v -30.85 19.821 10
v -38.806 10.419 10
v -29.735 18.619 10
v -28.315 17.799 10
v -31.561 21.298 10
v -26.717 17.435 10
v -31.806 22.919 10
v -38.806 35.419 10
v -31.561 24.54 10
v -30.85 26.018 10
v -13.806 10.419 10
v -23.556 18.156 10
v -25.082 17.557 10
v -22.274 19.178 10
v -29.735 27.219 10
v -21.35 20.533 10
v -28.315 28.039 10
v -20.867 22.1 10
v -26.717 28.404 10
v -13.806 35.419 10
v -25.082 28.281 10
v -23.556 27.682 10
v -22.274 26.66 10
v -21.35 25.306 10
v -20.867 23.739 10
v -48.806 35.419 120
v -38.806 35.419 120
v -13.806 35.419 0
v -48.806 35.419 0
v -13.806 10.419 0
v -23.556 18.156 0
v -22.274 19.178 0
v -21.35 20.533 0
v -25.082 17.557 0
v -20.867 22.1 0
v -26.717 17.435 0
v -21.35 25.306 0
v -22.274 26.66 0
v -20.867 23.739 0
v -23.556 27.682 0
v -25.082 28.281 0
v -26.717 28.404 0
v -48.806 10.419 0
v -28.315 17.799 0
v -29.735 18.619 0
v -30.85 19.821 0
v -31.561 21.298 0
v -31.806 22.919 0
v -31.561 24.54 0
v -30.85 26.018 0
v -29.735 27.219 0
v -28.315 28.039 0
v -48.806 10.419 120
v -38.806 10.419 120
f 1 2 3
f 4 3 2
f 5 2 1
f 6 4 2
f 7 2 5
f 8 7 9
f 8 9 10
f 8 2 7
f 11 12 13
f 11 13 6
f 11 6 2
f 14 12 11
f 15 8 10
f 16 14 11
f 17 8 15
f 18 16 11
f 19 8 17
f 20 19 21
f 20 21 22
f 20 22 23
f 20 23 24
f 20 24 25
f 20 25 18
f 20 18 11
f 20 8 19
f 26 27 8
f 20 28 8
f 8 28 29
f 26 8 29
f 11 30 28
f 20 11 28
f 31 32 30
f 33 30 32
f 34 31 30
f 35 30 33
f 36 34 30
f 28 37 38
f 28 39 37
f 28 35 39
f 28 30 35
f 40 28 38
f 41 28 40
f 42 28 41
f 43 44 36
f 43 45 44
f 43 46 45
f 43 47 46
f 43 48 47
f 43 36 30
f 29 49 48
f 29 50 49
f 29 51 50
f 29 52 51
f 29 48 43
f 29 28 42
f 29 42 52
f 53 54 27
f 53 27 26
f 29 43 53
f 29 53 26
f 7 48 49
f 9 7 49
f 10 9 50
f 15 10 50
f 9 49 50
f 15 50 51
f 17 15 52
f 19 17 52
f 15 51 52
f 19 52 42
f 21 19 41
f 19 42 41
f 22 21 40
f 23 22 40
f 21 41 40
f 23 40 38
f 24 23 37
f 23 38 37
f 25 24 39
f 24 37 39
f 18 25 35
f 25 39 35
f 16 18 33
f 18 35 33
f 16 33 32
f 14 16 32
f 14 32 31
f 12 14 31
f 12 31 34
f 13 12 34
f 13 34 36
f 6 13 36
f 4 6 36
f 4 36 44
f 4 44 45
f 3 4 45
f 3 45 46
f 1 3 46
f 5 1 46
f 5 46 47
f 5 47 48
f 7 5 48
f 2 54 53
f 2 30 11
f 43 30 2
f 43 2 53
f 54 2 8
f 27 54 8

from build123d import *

# Parameters (mm, degrees)
SKETCH_1_W          = 25
SKETCH_1_H          = 25
EXTRUDE_1_DEPTH     = 10
SKETCH_2_W          = 10
SKETCH_2_H          = 25
EXTRUDE_2_DEPTH     = 120
SKETCH_6_R          = 5.5
CUT_EXTRUDE_1_DEPTH = 121


with BuildPart() as part:
    # ｽｹｯﾁ1 → ﾎﾞｽ - 押し出し1 (new body)
    with BuildSketch(Plane.XY):
        with Locations((-26.305611861, 22.91927309)):
            Rectangle(SKETCH_1_W, SKETCH_1_H)
    extrude(amount=EXTRUDE_1_DEPTH)

    # ｽｹｯﾁ2 → ﾎﾞｽ - 押し出し2 (add)
    with BuildSketch(Plane(origin=(0, 0, 0), x_dir=(-1, 0, 0), z_dir=(0, 0, -1))):
        with Locations((43.805611861, 22.91927309)):
            Rectangle(SKETCH_2_W, SKETCH_2_H)
    extrude(amount=-EXTRUDE_2_DEPTH)

    # ｽｹｯﾁ6 → ｶｯﾄ - 押し出し1 (cut, through all)
    with BuildSketch(Plane(origin=(0, 0, 0), x_dir=(-1, 0, 0), z_dir=(0, 0, -1))):
        with Locations((26.305611861, 22.91927309)):
            Circle(SKETCH_6_R)
    extrude(amount=-CUT_EXTRUDE_1_DEPTH, mode=Mode.SUBTRACT)


solid = part.part
